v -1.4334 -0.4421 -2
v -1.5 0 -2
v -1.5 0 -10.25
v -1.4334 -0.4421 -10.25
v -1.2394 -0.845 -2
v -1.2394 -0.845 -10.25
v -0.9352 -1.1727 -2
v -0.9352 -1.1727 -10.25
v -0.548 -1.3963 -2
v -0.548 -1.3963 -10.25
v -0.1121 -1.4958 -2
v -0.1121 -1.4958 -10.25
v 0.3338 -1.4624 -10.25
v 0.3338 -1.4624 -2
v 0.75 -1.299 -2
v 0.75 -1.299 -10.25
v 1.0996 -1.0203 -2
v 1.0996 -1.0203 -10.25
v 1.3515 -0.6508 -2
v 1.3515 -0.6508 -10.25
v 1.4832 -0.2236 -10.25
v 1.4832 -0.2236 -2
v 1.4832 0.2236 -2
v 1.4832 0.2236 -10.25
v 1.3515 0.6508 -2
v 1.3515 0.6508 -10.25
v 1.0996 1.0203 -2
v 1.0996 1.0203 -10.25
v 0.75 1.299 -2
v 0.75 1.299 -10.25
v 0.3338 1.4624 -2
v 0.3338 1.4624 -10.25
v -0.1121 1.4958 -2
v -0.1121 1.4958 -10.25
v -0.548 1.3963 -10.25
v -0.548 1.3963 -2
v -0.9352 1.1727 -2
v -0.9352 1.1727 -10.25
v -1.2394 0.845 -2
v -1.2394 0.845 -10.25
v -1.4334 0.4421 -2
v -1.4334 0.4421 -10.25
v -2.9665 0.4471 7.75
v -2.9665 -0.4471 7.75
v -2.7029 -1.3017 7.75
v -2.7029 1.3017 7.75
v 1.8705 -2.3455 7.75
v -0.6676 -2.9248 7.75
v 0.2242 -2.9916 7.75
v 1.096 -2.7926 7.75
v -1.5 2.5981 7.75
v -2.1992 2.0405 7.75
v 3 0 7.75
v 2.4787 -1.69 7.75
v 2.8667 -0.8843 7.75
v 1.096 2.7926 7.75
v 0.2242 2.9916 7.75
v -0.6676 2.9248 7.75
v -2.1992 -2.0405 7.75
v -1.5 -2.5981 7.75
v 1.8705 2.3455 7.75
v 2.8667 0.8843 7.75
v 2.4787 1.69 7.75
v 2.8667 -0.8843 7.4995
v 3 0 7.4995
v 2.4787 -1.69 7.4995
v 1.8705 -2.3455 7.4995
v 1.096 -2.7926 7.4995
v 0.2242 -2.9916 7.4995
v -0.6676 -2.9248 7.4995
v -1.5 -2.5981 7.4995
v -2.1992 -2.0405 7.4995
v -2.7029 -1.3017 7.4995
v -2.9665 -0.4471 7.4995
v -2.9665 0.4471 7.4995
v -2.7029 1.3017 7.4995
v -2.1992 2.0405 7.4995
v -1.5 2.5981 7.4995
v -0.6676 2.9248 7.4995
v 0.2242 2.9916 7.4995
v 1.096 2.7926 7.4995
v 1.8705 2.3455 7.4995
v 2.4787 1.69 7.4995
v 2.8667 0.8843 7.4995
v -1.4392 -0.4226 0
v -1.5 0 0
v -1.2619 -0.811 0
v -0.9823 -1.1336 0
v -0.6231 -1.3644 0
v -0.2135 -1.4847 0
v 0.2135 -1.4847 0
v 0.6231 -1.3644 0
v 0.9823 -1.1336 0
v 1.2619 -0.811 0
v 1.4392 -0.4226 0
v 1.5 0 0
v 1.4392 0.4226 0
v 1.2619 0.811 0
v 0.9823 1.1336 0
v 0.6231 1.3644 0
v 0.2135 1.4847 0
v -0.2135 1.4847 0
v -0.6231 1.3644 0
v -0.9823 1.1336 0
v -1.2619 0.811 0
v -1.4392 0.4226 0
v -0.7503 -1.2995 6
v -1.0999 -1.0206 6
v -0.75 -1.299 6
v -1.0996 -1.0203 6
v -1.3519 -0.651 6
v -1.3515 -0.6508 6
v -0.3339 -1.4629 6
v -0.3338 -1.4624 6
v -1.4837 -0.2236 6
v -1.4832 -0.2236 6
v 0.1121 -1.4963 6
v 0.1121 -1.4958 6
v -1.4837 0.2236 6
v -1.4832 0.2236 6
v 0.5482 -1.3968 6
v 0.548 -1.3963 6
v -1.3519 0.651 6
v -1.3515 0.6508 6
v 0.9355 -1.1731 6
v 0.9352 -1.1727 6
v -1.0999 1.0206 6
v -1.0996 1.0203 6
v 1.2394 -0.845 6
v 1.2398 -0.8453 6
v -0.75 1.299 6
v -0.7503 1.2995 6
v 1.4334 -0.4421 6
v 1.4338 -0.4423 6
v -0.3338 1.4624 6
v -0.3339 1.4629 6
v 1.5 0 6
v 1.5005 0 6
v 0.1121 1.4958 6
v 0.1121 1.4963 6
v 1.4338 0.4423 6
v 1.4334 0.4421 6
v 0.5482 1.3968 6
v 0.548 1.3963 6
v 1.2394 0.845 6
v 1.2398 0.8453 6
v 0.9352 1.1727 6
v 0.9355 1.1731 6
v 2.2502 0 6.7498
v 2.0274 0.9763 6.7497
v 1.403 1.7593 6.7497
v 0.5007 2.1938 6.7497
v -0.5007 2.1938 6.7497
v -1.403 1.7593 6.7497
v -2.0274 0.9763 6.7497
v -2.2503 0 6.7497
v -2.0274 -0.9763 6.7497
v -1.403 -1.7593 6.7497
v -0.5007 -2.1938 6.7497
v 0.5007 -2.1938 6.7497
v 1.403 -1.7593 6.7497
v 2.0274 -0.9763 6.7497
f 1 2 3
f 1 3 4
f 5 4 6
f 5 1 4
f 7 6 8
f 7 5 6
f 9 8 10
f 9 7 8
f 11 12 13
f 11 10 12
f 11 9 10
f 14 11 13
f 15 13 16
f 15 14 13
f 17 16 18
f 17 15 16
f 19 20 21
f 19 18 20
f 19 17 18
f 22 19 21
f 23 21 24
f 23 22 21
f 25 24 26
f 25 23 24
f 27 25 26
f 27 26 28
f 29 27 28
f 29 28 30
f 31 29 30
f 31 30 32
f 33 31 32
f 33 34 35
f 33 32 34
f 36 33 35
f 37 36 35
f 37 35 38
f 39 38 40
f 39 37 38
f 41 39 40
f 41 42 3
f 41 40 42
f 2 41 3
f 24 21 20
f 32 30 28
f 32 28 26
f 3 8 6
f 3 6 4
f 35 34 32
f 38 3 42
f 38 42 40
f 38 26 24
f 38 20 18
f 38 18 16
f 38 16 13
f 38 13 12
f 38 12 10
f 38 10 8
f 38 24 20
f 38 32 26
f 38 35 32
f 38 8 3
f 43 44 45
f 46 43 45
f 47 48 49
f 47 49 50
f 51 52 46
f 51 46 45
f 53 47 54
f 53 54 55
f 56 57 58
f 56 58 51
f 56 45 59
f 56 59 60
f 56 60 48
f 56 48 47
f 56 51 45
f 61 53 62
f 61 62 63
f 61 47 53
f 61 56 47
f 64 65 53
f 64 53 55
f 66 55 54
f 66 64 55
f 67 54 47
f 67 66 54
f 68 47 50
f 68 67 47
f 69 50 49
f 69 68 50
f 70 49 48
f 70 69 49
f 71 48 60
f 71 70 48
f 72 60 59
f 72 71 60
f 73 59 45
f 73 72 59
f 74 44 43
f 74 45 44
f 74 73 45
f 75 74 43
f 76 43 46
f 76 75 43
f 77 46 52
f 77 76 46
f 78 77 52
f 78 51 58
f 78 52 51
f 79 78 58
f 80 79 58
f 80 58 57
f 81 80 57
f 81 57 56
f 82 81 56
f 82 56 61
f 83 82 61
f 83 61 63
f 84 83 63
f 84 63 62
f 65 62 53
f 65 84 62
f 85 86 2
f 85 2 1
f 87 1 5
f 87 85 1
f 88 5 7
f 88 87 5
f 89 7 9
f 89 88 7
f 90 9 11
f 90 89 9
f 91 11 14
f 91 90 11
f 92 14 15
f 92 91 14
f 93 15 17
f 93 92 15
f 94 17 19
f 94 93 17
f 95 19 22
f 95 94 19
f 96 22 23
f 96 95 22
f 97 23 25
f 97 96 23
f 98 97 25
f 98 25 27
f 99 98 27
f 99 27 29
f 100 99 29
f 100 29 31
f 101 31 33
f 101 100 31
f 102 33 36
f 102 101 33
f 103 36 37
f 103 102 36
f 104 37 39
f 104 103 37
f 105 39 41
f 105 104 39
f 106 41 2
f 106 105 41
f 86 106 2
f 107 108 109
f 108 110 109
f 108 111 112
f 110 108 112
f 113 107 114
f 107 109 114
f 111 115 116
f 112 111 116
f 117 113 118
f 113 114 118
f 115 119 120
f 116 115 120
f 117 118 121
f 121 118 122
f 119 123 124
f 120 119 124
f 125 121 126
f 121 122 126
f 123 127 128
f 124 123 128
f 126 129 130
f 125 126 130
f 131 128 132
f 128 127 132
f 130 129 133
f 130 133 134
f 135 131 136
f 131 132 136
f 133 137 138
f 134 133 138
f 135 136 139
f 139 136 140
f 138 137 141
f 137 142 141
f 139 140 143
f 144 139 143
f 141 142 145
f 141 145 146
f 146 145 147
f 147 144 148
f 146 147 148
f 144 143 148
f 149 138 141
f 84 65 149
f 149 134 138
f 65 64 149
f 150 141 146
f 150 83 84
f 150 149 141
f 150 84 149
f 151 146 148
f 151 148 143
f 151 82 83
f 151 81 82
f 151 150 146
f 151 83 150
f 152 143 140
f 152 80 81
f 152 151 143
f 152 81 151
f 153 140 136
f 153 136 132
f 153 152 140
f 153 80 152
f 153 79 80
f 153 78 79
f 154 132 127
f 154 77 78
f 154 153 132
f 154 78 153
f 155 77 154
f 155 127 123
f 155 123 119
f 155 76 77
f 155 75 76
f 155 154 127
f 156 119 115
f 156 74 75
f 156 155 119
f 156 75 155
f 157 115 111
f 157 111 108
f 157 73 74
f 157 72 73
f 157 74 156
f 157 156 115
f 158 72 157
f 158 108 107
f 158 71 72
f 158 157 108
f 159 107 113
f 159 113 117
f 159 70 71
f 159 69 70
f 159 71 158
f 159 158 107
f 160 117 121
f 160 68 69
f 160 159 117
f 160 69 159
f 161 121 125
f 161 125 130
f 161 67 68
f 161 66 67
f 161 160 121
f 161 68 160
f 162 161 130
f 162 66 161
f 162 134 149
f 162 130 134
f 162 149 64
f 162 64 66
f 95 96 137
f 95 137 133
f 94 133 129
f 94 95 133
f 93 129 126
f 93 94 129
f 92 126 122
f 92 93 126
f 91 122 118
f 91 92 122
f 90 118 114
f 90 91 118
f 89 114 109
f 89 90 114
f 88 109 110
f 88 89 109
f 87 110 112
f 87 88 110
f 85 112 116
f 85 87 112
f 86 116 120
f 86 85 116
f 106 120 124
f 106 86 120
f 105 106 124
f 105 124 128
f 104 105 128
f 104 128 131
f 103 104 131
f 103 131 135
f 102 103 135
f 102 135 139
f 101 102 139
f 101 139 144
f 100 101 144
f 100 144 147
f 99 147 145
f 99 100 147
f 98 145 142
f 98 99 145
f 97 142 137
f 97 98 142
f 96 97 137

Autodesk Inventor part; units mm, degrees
ref_plane "YZ Plane" through (0, 0, 0) normal (1, 0, 0) x (0, 1, 0)
ref_plane "XZ Plane" through (0, 0, 0) normal (0, 1, 0) x (-1, 0, 0)
ref_plane "XY Plane" through (0, 0, 0) normal (0, 0, 1) x (1, 0, 0)
sketch "スケッチ1" plane through (0, 0, 0) normal (0, 0, 1) x (1, 0, 0)
  circle A0 centre (0, 0) radius 1.5
  dimension "d0" = 3
extrude "押し出し1" add sketch "スケッチ1" along normal blind 6
sketch "スケッチ2" plane through (0, 0, 6) normal (0, 0, 1) x (1, 0, 0)
  circle A0 centre (0, 0) radius 1.5 projected
  circle A1 centre (0, 0) radius 3
  dimension "d3" = 6
extrude "押し出し2" add sketch "スケッチ2" along normal blind 1.75 contours A0 | A1
thread "ねじ1" size "M3x0.5" class "6g" standard "ANSI Metric M Profile" full length
chamfer "面取り1" distance 1.5 angle 45 1 edges at (-3, 0, 6)
sketch "スケッチ4" plane through (0, 0, 0) normal (0, 0, -1) x (-1, 0, 0)
  circle A0 centre (0, 0) radius 1.5 projected
extrude "押し出し4" add sketch "スケッチ4" along normal blind 4
sketch "スケッチ5" plane through (0, 0, -4) normal (0, 0, -1) x (-1, 0, 0)
  circle A0 centre (0, 0) radius 1.5 projected
extrude "押し出し5" cut sketch "スケッチ5" against normal blind 2
sketch "スケッチ6" plane through (0, 0, -2) normal (0, 0, -1) x (-1, 0, 0)
  circle A0 centre (0, 0) radius 1.5 projected
extrude "押し出し6" add sketch "スケッチ6" along normal blind 8.25
properties part number "SB　18mm皿ネジ" material "Steel, Mild"
